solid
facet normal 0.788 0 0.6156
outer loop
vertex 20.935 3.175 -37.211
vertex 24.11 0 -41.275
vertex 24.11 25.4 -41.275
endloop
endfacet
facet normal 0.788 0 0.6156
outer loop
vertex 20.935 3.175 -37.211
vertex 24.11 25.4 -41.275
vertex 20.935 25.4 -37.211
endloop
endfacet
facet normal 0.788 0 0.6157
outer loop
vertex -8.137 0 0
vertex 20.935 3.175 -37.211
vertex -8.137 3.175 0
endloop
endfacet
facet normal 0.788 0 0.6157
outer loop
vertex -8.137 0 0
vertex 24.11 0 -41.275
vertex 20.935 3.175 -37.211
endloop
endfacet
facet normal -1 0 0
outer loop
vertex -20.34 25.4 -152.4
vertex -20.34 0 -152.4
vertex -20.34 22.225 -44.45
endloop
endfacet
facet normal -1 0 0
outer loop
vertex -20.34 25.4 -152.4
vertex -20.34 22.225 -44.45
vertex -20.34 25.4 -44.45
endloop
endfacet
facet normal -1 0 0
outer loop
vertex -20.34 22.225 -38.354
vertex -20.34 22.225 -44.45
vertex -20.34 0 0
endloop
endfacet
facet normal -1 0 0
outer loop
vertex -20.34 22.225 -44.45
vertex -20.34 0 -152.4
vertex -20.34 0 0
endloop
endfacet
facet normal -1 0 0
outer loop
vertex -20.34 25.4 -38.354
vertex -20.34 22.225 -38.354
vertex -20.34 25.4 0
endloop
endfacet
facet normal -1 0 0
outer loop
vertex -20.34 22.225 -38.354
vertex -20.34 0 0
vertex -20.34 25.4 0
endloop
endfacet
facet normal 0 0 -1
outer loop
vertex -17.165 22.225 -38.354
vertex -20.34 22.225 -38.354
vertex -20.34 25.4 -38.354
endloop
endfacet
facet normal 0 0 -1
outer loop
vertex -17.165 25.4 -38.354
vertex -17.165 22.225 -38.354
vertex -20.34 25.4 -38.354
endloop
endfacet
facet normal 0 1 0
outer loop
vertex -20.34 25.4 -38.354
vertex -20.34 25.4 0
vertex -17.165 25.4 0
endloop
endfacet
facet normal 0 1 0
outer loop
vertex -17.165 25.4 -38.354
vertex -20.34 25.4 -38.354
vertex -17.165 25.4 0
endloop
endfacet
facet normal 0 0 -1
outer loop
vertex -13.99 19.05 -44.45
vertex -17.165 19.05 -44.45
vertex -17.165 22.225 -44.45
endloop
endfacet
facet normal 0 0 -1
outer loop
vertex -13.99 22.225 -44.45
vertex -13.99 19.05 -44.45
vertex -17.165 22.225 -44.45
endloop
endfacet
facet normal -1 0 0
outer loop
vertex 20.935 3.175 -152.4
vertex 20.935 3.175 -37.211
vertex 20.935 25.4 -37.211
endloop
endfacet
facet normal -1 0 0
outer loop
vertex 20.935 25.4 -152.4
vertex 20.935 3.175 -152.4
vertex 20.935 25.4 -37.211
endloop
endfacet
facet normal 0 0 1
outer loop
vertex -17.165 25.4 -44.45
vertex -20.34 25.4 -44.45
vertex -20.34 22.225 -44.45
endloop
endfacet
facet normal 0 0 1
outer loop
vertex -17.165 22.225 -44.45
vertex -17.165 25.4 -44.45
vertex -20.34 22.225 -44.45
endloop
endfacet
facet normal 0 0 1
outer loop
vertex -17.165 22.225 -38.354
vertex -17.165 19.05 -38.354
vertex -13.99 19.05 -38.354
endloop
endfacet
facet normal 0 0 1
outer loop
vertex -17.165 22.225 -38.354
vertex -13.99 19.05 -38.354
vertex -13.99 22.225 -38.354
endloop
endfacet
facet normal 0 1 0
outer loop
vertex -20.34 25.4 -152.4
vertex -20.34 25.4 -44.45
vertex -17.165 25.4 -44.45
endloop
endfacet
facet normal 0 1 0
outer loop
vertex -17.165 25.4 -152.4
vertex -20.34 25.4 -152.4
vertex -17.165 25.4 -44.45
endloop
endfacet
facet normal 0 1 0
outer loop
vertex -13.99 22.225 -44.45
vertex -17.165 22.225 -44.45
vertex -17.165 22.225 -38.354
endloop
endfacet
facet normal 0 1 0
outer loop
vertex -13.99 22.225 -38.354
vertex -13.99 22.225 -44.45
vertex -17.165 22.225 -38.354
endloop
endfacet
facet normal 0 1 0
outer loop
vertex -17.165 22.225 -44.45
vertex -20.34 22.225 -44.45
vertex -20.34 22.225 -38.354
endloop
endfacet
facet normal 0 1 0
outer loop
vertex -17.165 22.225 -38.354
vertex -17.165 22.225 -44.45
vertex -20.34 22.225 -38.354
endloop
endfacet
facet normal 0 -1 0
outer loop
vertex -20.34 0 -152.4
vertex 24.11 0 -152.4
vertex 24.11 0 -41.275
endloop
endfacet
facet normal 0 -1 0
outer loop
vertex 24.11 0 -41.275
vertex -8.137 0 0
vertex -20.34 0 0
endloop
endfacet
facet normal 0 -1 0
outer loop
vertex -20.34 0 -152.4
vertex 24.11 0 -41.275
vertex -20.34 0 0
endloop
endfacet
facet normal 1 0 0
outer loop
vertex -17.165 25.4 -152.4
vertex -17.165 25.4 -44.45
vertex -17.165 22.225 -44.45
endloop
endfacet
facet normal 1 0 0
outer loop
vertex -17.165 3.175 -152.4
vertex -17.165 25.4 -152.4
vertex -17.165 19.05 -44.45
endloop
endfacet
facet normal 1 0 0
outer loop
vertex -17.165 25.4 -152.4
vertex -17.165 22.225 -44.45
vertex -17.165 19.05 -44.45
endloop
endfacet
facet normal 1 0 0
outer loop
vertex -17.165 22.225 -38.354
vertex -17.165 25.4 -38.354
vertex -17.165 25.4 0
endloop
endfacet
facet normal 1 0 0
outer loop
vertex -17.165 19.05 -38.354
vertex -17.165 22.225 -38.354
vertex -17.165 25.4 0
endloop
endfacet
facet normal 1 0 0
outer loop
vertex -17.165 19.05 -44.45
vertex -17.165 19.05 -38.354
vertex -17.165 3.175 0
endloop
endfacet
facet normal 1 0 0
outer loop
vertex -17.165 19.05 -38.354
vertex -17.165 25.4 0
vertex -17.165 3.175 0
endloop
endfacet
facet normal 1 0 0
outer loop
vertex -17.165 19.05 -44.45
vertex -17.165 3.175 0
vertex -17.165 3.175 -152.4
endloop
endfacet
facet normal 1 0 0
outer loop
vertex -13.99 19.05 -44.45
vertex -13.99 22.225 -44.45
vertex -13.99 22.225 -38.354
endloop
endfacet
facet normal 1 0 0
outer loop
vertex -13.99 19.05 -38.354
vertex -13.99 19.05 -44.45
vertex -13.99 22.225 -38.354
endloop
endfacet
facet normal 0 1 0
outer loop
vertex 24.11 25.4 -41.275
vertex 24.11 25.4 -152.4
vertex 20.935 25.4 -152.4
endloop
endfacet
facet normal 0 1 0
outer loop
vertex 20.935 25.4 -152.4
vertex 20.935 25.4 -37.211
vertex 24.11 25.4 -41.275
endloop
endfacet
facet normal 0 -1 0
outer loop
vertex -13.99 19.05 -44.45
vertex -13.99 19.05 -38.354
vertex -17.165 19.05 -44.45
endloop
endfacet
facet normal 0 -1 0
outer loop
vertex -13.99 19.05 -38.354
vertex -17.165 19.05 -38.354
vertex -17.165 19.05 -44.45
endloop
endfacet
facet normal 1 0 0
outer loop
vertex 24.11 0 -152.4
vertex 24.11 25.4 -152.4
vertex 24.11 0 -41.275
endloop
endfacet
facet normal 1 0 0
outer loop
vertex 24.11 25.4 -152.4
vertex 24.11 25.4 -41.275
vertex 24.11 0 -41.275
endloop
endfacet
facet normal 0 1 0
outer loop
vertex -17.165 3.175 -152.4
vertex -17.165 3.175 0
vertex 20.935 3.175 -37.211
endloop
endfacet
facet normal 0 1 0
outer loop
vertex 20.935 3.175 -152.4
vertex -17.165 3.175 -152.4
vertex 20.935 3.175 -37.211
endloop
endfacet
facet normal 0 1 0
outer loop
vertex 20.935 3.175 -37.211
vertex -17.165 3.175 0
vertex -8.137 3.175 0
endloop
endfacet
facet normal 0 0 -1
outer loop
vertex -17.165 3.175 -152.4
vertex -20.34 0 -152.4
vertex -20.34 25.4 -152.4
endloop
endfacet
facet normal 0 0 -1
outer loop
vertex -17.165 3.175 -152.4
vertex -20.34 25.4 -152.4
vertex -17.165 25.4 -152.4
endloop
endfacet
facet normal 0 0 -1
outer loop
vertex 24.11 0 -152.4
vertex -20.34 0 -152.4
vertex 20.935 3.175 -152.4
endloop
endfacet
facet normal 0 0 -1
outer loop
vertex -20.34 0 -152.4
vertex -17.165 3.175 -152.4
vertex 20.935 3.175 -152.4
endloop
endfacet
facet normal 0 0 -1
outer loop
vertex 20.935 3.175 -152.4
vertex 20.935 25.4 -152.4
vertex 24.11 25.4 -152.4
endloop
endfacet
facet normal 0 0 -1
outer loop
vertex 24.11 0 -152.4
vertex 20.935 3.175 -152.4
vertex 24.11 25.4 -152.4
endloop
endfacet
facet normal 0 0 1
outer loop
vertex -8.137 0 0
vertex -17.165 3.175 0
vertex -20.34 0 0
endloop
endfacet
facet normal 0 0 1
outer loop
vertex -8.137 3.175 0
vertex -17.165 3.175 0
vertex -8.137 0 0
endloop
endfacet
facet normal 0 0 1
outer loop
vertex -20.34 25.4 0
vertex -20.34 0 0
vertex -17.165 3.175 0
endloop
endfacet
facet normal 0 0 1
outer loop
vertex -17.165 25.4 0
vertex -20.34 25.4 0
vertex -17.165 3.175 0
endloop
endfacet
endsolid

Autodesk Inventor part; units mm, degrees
ref_plane "YZ Plane" through (0, 0, 0) normal (1, 0, 0) x (0, 1, 0)
ref_plane "XZ Plane" through (0, 0, 0) normal (0, 1, 0) x (-1, 0, 0)
ref_plane "XY Plane" through (0, 0, 0) normal (0, 0, 1) x (1, 0, 0)
sketch "Sketch1" plane through (0, 0, 0) normal (0, 0, 1) x (1, 0, 0)
  line L0 (24.1101, 25.4) -> (24.1101, 0)
  line L1 (24.1101, 0) -> (-20.3399, 0)
  line L2 (-20.3399, 0) -> (-20.3399, 25.4)
  line L3 (-17.1649, 25.4) -> (-17.1649, 3.175)
  line L4 (-17.1649, 3.175) -> (20.9351, 3.175)
  line L5 (20.9351, 3.175) -> (20.9351, 25.4)
  line L6 (-20.3399, 25.4) -> (-17.1649, 25.4)
  line L7 (24.1101, 25.4) -> (20.9351, 25.4)
  point P0 (0, 0)
  dimension "d0" = 44.45
  dimension "d1" = 25.4
  dimension "d2" = 3.175
extrude "Extrusion1" add sketch "Sketch1" against normal blind 152.4
sketch "Sketch3" plane through (-20.3399, 0, 0) normal (-1, 0, 0) x (0, 0, 1)
  line L0 (0, 25.4) -> (-152.4, 25.4) projected
  line L1 (-152.4, 0) -> (-152.4, 25.4) projected
  line L2 (0, 0) -> (-152.4, 0) projected
  line L3 (-44.45, 25.4) -> (-44.45, 19.05)
  line L4 (-44.45, 19.05) -> (-38.354, 19.05)
  line L5 (-38.354, 19.05) -> (-38.354, 25.4)
  dimension "d6" = 6.096
  dimension "d7" = 6.35
  dimension "d8" = 107.95
extrude "Extrusion2" cut sketch "Sketch3" against normal up to next
sketch "Sketch4" plane through (-20.3399, 0, 0) normal (-1, 0, 0) x (0, 0, 1)
  line L0 (-38.354, 19.05) -> (-44.45, 19.05) projected
  line L1 (-44.45, 19.05) -> (-44.45, 22.225)
  line L2 (-44.45, 25.4) -> (-44.45, 19.05) projected
  line L3 (-38.354, 19.05) -> (-38.354, 25.4) projected
  line L4 (-38.354, 19.05) -> (-44.45, 19.05)
  line L5 (-44.45, 19.05) -> (-38.354, 19.05) projected
  line L6 (-44.45, 22.225) -> (-38.354, 22.225)
  line L7 (-38.354, 19.05) -> (-38.354, 22.225)
  dimension "d11" = 3.175
extrude "Extrusion3" add sketch "Sketch4" against normal blind 6.35
sketch "Sketch5" plane through (-20.3399, 0, 0) normal (0, -1, 0) x (1, 0, 0)
  line L0 (0, 0) -> (44.45, 0) projected
  line L1 (44.45, 0) -> (44.45, -152.4) projected
  line L2 (44.45, -152.4) -> (44.45, -41.275)
  line L3 (44.45, 0) -> (44.45, -152.4) projected
  line L4 (44.45, -41.275) -> (12.2024, 0)
  line L5 (12.2024, 0) -> (44.45, 0)
  line L6 (44.45, 0) -> (44.45, -41.275)
  point P0 (20.3399, 0)
  dimension "d14" = 111.125
  dimension "d15" = 38
extrude "Extrusion4" cut sketch "Sketch5" against normal through all
properties part number "Horizontal channel"
